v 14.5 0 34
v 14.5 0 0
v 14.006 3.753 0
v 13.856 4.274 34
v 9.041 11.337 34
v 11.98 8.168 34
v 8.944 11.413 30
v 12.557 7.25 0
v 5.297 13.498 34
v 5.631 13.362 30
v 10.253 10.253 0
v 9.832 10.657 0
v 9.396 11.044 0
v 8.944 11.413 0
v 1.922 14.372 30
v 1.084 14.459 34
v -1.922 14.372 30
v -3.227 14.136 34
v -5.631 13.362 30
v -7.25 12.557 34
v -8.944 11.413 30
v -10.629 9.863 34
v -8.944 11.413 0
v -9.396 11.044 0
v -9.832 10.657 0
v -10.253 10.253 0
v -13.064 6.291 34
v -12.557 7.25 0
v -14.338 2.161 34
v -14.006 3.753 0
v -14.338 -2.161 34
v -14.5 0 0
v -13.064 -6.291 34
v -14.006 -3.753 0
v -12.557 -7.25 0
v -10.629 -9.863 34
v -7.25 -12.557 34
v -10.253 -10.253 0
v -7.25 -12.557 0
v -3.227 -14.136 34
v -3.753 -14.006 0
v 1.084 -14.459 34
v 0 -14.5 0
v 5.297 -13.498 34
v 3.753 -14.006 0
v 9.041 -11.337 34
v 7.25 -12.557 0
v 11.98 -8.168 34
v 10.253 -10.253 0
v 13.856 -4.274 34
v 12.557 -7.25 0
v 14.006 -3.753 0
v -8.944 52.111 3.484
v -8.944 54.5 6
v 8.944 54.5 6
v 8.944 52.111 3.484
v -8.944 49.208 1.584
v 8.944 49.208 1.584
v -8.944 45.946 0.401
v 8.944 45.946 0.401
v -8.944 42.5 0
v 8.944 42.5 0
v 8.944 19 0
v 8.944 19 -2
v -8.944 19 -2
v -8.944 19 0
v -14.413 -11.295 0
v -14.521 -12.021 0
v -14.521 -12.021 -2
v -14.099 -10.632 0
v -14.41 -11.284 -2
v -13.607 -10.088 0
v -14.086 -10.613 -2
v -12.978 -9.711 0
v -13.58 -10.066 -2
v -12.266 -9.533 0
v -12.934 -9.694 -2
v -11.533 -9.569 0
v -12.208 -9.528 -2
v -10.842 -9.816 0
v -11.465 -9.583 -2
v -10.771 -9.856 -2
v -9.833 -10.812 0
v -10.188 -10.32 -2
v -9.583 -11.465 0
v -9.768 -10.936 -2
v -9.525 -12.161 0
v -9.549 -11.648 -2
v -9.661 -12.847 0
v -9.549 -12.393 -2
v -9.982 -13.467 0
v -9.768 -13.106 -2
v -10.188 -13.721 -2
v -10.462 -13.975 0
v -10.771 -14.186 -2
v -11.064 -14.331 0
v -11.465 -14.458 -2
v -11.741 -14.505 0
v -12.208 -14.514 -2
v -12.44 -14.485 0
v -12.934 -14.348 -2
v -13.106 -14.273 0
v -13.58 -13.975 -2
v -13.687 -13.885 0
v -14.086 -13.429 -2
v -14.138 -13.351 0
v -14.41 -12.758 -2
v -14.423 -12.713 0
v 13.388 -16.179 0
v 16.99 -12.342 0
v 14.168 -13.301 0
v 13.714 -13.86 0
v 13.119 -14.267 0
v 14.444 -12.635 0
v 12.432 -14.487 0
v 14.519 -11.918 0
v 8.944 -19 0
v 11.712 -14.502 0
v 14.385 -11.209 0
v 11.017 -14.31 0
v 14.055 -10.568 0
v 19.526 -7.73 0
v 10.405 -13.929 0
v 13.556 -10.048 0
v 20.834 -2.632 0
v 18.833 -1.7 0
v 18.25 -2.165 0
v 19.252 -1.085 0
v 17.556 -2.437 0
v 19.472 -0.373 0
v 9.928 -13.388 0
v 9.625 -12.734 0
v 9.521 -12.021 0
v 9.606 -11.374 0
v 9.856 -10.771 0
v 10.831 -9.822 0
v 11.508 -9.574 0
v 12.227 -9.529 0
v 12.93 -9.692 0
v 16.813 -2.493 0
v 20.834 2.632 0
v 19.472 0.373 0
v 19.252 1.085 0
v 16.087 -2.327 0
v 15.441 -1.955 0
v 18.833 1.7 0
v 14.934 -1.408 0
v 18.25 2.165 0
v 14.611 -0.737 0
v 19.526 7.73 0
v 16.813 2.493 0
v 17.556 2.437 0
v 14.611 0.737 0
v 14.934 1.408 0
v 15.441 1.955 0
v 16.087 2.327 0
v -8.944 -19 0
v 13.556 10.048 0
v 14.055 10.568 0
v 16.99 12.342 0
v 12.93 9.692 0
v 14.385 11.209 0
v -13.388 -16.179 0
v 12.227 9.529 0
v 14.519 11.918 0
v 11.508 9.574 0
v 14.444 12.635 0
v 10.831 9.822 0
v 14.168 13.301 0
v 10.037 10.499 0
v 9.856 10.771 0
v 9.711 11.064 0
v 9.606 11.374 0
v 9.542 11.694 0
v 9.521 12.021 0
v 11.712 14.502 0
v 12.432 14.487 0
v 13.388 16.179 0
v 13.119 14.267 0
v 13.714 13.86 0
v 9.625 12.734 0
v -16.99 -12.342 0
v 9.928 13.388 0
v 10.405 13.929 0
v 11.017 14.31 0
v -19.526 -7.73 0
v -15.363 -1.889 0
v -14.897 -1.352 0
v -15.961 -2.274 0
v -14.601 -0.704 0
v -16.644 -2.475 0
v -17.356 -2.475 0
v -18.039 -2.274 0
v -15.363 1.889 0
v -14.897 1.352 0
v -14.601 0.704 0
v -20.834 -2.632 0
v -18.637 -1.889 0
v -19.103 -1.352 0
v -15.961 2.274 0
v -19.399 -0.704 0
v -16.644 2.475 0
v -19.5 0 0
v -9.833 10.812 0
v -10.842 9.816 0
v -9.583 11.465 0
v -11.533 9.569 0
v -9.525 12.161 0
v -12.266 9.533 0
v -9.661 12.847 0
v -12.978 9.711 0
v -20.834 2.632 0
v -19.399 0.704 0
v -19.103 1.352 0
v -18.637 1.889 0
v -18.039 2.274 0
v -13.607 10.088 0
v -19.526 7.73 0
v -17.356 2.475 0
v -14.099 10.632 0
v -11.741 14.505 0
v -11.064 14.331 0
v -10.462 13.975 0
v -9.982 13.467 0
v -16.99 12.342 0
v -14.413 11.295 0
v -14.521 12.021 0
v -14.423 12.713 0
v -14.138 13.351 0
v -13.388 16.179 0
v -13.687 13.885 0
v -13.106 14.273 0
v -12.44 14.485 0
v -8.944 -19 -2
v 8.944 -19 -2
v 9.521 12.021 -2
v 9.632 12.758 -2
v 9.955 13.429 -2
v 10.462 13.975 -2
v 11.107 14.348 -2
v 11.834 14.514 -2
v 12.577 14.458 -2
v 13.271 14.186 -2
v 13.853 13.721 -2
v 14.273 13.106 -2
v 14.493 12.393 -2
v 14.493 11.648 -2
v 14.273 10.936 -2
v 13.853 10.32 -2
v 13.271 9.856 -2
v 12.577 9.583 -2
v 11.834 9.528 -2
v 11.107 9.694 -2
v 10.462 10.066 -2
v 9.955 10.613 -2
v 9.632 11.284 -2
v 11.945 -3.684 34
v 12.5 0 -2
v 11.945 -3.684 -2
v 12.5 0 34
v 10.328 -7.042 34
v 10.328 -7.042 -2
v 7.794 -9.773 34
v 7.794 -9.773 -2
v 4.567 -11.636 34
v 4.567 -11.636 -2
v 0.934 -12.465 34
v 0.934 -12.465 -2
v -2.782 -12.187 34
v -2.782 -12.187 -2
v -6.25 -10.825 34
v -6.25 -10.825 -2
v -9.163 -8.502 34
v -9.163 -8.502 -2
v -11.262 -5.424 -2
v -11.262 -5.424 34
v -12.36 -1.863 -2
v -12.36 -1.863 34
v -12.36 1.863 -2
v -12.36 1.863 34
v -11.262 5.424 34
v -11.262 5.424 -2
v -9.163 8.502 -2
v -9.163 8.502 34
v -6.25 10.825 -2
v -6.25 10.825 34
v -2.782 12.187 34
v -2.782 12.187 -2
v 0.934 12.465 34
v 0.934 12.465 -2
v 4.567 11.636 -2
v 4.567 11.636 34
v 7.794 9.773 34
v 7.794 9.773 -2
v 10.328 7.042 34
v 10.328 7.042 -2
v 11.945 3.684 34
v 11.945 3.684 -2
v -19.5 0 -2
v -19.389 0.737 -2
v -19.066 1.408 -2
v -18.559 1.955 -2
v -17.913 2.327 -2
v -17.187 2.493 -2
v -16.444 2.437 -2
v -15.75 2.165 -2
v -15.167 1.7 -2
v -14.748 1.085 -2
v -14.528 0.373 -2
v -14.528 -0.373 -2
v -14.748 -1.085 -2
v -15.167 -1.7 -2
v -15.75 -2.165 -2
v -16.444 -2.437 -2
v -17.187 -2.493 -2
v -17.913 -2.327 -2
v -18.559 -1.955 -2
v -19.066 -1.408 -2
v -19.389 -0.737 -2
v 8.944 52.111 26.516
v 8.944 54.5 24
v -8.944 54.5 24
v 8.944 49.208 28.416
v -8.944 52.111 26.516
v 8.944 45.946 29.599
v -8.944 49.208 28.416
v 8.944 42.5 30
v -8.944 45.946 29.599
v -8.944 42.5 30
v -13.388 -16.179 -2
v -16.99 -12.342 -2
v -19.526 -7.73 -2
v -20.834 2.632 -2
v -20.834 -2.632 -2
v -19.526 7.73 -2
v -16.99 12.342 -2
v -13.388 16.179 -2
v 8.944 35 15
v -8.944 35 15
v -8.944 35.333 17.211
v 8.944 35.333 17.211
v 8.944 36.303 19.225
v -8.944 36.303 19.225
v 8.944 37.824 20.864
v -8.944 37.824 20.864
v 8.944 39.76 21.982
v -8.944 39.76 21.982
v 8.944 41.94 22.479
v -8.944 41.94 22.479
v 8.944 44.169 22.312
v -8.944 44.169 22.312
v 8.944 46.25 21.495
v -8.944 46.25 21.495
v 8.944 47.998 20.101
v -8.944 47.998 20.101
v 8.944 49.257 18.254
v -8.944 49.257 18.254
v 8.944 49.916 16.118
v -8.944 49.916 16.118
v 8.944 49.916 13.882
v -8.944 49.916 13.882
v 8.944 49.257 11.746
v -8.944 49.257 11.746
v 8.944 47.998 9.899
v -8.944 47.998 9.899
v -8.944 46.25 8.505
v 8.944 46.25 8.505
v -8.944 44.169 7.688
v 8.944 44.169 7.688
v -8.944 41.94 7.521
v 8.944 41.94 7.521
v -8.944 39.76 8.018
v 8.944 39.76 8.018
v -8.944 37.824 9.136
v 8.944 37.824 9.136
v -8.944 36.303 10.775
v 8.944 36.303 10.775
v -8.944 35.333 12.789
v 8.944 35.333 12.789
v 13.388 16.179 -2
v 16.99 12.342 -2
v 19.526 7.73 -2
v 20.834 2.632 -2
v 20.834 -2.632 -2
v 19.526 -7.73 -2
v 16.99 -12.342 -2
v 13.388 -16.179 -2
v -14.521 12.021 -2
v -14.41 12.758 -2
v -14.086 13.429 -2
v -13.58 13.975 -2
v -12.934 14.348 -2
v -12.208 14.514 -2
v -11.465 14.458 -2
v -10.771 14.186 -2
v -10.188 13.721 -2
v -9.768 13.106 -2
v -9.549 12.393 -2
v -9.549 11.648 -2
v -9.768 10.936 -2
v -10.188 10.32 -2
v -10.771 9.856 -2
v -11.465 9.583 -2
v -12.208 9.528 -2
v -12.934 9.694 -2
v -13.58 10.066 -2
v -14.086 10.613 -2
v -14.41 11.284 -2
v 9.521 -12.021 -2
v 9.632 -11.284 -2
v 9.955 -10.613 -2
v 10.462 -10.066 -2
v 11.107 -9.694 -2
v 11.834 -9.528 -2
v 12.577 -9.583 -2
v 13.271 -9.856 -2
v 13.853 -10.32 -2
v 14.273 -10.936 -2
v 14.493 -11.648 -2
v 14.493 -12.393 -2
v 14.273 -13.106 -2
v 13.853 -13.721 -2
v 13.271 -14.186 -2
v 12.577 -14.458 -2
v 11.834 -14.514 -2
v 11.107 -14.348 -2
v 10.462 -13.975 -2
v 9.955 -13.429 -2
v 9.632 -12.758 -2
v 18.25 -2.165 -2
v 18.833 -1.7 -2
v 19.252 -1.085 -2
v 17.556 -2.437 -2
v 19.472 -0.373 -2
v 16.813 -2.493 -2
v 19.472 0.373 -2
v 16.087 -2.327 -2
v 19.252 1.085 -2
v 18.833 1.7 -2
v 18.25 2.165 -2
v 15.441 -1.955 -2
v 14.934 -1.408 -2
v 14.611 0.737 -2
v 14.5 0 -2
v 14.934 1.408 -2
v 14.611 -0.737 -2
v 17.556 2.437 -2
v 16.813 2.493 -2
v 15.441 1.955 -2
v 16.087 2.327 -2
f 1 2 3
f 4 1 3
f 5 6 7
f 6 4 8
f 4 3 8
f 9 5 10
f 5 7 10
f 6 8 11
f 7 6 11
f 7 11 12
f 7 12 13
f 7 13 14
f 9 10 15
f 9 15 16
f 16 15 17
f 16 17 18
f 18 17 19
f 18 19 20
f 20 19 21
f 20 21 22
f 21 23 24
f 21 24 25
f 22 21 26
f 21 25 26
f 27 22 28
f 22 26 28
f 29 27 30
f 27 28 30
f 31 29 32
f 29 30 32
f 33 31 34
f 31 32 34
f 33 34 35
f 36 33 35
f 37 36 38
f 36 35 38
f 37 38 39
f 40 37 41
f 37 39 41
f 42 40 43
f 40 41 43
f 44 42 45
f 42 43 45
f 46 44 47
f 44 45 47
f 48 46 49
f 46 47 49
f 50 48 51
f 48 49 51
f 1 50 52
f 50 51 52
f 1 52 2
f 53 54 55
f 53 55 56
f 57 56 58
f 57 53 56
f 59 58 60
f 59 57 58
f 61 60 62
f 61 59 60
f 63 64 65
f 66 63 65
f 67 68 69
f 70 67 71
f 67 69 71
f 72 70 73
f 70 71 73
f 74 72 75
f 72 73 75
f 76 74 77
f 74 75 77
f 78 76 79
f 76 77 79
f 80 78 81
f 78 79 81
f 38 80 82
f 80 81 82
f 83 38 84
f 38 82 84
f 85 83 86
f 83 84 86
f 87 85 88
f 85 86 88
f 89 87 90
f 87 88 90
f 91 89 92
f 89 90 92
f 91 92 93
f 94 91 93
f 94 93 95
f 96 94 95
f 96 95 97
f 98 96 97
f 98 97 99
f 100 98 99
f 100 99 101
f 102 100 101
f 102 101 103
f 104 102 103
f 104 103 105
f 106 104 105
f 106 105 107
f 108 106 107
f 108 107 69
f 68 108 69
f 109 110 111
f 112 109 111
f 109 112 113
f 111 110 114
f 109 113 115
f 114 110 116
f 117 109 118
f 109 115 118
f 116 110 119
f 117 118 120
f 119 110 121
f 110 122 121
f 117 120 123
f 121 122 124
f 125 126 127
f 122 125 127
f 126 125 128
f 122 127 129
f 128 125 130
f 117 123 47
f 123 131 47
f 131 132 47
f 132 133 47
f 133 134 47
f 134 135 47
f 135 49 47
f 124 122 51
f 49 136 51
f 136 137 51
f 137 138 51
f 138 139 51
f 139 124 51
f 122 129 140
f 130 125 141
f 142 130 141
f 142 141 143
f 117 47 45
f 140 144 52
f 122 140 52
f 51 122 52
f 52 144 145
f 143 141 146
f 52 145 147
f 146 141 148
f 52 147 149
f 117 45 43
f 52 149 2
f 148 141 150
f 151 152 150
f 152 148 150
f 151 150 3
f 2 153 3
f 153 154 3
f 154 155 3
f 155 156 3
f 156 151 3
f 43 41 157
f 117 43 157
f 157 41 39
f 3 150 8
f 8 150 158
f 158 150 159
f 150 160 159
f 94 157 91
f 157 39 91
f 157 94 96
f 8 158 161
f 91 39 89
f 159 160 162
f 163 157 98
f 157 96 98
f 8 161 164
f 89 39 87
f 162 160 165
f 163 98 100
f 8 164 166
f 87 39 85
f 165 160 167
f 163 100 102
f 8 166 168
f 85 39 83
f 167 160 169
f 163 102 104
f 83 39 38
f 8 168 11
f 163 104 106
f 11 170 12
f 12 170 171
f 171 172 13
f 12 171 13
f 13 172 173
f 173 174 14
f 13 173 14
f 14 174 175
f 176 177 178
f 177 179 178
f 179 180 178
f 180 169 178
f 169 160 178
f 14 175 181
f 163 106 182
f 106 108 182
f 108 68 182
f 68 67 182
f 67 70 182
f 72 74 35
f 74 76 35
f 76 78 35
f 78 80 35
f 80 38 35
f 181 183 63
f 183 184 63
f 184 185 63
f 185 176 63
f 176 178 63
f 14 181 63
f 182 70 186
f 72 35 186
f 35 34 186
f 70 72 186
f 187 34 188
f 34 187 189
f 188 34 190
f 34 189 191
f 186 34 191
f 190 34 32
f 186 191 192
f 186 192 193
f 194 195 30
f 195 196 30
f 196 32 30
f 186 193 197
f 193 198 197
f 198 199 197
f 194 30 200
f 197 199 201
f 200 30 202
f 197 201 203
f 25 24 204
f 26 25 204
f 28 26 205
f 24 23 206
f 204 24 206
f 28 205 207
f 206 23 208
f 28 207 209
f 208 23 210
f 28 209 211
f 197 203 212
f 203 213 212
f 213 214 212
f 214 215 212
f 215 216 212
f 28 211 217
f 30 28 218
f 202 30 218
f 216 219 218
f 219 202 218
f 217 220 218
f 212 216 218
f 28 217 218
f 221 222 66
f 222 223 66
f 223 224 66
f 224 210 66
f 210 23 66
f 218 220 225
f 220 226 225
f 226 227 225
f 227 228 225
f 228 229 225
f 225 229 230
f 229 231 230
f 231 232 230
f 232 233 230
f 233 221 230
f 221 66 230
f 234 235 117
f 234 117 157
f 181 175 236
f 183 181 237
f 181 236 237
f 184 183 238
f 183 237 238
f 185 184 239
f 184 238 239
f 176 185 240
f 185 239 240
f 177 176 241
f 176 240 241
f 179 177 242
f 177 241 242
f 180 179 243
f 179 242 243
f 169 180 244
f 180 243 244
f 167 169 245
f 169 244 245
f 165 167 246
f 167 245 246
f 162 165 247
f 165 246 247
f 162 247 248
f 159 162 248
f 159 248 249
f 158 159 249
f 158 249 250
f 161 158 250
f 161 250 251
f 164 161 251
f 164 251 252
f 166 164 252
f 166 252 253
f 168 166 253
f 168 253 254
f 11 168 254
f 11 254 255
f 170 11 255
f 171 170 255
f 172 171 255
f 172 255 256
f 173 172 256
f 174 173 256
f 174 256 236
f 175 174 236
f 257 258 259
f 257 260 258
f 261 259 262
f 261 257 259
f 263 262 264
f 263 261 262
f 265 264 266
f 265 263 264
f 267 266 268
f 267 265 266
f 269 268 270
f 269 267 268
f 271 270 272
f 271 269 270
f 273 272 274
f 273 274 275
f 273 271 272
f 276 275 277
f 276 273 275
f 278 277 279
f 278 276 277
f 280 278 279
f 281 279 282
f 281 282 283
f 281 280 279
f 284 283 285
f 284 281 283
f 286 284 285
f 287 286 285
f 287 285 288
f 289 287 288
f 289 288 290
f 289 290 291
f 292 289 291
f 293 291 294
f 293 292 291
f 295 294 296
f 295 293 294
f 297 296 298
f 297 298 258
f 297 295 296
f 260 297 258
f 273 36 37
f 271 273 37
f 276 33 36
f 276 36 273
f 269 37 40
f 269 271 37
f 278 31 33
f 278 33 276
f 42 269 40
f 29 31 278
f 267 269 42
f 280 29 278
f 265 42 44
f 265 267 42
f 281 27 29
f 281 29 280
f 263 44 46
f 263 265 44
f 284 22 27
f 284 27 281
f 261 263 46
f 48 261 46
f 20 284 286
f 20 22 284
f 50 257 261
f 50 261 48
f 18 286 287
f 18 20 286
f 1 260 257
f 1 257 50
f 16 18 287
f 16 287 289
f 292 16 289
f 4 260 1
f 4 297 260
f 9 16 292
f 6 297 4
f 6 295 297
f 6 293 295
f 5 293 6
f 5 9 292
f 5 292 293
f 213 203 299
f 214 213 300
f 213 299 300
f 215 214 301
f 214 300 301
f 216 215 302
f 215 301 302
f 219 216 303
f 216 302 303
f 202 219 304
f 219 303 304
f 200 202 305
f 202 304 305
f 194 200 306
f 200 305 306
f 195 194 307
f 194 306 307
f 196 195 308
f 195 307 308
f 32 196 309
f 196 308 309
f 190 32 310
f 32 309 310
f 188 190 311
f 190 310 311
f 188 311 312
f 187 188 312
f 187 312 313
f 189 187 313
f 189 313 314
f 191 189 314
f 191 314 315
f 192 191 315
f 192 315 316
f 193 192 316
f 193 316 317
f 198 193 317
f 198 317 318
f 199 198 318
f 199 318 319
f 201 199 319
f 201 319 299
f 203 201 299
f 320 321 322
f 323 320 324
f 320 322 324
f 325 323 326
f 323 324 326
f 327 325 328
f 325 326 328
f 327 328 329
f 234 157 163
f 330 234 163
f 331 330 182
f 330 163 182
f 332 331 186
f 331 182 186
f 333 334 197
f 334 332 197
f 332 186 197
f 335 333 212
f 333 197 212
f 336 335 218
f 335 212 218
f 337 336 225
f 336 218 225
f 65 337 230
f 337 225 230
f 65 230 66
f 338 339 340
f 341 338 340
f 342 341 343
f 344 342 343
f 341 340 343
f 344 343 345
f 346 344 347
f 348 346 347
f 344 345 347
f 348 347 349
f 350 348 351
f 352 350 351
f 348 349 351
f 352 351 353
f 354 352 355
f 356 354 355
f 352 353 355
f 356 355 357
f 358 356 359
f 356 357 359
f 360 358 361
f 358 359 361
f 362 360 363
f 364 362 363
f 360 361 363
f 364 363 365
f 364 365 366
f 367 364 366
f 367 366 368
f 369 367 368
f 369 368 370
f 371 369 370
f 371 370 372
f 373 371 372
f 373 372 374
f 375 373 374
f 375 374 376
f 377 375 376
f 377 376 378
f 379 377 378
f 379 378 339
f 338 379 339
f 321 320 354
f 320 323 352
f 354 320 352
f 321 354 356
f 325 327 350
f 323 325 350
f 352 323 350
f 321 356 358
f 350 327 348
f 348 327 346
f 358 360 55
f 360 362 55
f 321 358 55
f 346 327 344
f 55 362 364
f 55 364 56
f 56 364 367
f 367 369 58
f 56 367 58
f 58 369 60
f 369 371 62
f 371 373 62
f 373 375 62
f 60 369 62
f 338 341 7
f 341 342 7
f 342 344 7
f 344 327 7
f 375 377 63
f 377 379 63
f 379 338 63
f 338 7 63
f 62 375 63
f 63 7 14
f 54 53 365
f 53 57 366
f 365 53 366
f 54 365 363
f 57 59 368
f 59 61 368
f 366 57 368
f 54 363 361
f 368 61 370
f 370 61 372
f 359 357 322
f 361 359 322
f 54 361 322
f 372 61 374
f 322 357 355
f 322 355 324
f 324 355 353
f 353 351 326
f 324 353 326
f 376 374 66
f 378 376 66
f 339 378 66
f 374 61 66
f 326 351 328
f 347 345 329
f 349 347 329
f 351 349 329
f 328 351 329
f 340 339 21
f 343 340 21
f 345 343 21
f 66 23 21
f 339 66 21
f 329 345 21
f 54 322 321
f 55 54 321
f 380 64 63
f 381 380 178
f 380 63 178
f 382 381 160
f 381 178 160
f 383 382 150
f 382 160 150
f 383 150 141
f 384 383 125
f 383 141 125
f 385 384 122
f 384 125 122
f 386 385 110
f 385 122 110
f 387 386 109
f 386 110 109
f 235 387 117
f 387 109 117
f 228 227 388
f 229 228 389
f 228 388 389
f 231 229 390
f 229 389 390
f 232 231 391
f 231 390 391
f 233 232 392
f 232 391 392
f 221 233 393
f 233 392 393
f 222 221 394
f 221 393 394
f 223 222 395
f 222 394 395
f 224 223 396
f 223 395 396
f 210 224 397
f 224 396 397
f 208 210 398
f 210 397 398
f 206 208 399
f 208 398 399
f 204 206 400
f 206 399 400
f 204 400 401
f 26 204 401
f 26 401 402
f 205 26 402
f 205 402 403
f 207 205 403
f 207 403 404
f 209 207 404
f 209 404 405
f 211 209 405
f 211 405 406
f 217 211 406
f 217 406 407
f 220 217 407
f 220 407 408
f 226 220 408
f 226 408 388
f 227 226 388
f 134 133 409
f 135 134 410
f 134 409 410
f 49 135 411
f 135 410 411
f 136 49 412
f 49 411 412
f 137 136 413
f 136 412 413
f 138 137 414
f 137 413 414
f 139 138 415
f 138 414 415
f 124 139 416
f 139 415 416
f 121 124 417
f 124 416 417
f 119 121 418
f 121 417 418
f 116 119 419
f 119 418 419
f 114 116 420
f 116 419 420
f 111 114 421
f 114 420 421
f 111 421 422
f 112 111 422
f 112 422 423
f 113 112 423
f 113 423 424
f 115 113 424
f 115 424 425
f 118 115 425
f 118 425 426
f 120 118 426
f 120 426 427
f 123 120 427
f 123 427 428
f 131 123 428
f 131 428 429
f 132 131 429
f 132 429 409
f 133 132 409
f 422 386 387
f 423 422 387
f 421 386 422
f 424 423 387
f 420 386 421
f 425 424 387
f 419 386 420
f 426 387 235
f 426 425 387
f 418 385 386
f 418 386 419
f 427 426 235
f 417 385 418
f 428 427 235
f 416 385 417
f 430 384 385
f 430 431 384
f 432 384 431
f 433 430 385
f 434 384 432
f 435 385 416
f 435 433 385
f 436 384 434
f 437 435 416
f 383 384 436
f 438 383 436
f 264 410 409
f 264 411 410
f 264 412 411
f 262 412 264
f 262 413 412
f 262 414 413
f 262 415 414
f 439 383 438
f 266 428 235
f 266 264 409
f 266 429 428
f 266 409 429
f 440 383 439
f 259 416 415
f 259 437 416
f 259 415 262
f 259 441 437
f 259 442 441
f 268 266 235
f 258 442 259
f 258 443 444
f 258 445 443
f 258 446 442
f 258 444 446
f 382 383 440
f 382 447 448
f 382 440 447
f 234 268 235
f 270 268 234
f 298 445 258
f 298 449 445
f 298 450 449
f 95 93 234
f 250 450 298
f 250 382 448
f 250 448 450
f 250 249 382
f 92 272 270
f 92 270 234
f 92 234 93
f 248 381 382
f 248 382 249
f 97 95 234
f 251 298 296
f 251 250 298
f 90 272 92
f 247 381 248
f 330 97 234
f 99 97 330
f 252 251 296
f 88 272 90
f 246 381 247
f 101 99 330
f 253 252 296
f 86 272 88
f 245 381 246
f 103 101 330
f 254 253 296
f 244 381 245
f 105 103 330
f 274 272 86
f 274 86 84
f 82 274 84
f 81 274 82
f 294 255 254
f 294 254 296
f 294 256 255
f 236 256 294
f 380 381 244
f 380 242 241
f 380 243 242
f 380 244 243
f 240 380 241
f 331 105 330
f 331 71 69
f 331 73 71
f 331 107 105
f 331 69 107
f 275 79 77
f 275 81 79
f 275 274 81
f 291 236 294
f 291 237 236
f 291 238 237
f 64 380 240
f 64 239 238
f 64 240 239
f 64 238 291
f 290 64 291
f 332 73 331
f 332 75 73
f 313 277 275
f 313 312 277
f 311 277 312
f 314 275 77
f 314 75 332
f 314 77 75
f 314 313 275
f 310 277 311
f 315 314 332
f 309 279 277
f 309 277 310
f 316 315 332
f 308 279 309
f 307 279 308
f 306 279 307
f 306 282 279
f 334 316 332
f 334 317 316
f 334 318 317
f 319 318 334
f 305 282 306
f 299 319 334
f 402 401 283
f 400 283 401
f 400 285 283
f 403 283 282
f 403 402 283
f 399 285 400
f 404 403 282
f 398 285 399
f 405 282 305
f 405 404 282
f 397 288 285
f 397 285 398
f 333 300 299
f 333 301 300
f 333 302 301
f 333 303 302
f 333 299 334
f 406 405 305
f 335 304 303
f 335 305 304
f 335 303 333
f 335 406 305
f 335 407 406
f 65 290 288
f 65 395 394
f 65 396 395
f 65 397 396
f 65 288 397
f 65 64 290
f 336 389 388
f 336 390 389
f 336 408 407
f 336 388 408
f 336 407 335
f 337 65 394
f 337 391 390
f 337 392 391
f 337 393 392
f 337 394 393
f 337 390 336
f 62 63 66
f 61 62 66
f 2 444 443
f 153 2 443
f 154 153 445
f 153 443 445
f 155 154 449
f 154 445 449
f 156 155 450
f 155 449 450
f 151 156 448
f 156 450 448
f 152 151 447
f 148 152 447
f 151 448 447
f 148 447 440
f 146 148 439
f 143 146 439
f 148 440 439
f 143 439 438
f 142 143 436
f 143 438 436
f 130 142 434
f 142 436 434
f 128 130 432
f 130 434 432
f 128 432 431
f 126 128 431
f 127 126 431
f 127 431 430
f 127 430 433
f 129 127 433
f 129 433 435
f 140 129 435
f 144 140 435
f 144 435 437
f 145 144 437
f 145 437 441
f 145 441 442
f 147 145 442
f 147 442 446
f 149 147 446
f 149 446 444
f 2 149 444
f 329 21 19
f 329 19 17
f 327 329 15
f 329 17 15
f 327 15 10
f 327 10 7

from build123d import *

# Parameters (mm, degrees)
IZIM1_R                          = 14.5
IZIM1_R_2                        = 12.5
Y_KSEKLIK_EKSTR_ZYON1_DEPTH      = 34
IZIM2_R                          = 21
IZIM2_R_2                        = 12.5
Y_KSEKLIK_EKSTR_ZYON2_DEPTH      = 2
IZIM3_R                          = 2.5
KES_EKSTR_ZYON1_DEPTH            = 78
KES_EKSTR_ZYON2_DEPTH            = 78
Y_KSEKLIK_EKSTR_ZYON5_REACH      = 54.146
Y_KSEKLIK_EKSTR_ZYON5_END_RADIUS = 14.5
IZIM6_W                          = 30
IZIM6_H                          = 17.88854382
Y_KSEKLIK_EKSTR_ZYON6_DEPTH      = 40
IZIM10_R                         = 7.5
KES_EKSTR_ZYON3_DEPTH            = 30
KES_EKSTR_ZYON4_DEPTH            = 93


with BuildPart() as part:
    # Çizim1 → Yükseklik-Ekstrüzyon1 (new body)
    with BuildSketch(Plane.XY):
        Circle(IZIM1_R)
        Circle(IZIM1_R_2, mode=Mode.SUBTRACT)
    extrude(amount=Y_KSEKLIK_EKSTR_ZYON1_DEPTH)



with BuildPart() as body_2:
    # Çizim2 → Yükseklik-Ekstrüzyon2 (new body)
    with BuildSketch(Plane(origin=(0, 0, 0), x_dir=(-1, 0, 0), z_dir=(0, 0, -1))):
        Circle(IZIM2_R)
        with Locations(Location((0, 0, 0), (0, 0, 180))):
            Circle(IZIM2_R_2, mode=Mode.SUBTRACT)
    extrude(amount=Y_KSEKLIK_EKSTR_ZYON2_DEPTH)

    # Çizim3 → Kes-Ekstrüzyon1 (cut)
    with BuildSketch(Plane(origin=(0, 0, -2), x_dir=(-1, 0, 0), z_dir=(0, 0, -1))):
        with Locations((-17, 0)):
            Circle(IZIM3_R)
        with Locations((-12.02081528, 12.02081528)):
            Circle(IZIM3_R)
        with Locations((12.02081528, 12.02081528)):
            Circle(IZIM3_R)
        with Locations((17, 0)):
            Circle(IZIM3_R)
        with Locations((12.02081528, -12.02081528)):
            Circle(IZIM3_R)
        with Locations((-12.02081528, -12.02081528)):
            Circle(IZIM3_R)
    extrude(amount=-KES_EKSTR_ZYON1_DEPTH, mode=Mode.SUBTRACT)

    # Çizim4 → Kes-Ekstrüzyon2 (cut)
    with BuildSketch(Plane(origin=(0, 0, -2), x_dir=(-1, 0, 0), z_dir=(0, 0, -1))):
        with BuildLine():
            Line((-8.94427191, 19), (8.94427191, 19))
            ThreePointArc((8.94427191, 19), (0, 21), (-8.94427191, 19))
        make_face()
        with BuildLine():
            Line((-8.94427191, -19), (8.94427191, -19))
            ThreePointArc((8.94427191, -19), (0, -21), (-8.94427191, -19))
        make_face()
    extrude(amount=-KES_EKSTR_ZYON2_DEPTH, mode=Mode.SUBTRACT)


with BuildPart() as part_1:
    add(part.part)

    add(body_2.part)  # Yükseklik-Ekstrüzyon5 merges body 2
    # Yükseklik-Ekstrüzyon5: up to this cylinder (the profile starts outside it)
    y_kseklik_ekstr_zyon5_end = Plane(origin=(0, 0, 15), z_dir=(0, 0, -1)) * Cylinder(Y_KSEKLIK_EKSTR_ZYON5_END_RADIUS, 138.292, mode=Mode.PRIVATE)
    # Çizim6 → Yükseklik-Ekstrüzyon5 (add, up to the surface)
    with BuildSketch(Plane(origin=(0, 14.5, 0), x_dir=(0, 0, -1), z_dir=(0, 1, 0)), mode=Mode.PRIVATE) as y_kseklik_ekstr_zyon5_sk1:
        with Locations((-15, 0)):
            Rectangle(IZIM6_W, IZIM6_H)
    y_kseklik_ekstr_zyon5_tool1 = extrude(y_kseklik_ekstr_zyon5_sk1.sketch, amount=-Y_KSEKLIK_EKSTR_ZYON5_REACH, mode=Mode.PRIVATE) - y_kseklik_ekstr_zyon5_end
    add(y_kseklik_ekstr_zyon5_tool1.solids().sort_by_distance((0, 14.5, 15))[0])
    add(y_kseklik_ekstr_zyon5_tool1.solids().sort_by_distance((0, 14.5, 15))[1])

    # Çizim9 → Yükseklik-Ekstrüzyon6 (add)
    with BuildSketch(Plane(origin=(0, 14.5, 0), x_dir=(1, 0, 0), z_dir=(0, 1, 0))):
        Polygon((-8.94427191, -30), (0, -30), (8.94427191, -30), (8.94427191, 0), (-8.94427191, 0), align=None)
    extrude(amount=Y_KSEKLIK_EKSTR_ZYON6_DEPTH)

    # Çizim10 → Kes-Ekstrüzyon3 (cut)
    with BuildSketch(Plane.ZY.offset(8.94427191)):
        with Locations(Location((15, 42.5, 0), (0, 0, 270))):
            Circle(IZIM10_R)
    extrude(amount=-KES_EKSTR_ZYON3_DEPTH, mode=Mode.SUBTRACT)

    # Çizim11 → Kes-Ekstrüzyon4 (cut)
    with BuildSketch(Plane.ZY.offset(8.94427191)):
        with BuildLine():
            Line((30, 42.5), (30, 54.5))
            Line((30, 54.5), (24, 54.5))
            ThreePointArc((24, 54.5), (28.416407865, 49.208203932), (30, 42.5))
        make_face()
        with BuildLine():
            Line((0, 54.5), (6, 54.5))
            ThreePointArc((6, 54.5), (1.583592135, 49.208203932), (0, 42.5))
            Line((0, 42.5), (0, 54.5))
        make_face()
    extrude(amount=-KES_EKSTR_ZYON4_DEPTH, mode=Mode.SUBTRACT)


solid = part_1.part
